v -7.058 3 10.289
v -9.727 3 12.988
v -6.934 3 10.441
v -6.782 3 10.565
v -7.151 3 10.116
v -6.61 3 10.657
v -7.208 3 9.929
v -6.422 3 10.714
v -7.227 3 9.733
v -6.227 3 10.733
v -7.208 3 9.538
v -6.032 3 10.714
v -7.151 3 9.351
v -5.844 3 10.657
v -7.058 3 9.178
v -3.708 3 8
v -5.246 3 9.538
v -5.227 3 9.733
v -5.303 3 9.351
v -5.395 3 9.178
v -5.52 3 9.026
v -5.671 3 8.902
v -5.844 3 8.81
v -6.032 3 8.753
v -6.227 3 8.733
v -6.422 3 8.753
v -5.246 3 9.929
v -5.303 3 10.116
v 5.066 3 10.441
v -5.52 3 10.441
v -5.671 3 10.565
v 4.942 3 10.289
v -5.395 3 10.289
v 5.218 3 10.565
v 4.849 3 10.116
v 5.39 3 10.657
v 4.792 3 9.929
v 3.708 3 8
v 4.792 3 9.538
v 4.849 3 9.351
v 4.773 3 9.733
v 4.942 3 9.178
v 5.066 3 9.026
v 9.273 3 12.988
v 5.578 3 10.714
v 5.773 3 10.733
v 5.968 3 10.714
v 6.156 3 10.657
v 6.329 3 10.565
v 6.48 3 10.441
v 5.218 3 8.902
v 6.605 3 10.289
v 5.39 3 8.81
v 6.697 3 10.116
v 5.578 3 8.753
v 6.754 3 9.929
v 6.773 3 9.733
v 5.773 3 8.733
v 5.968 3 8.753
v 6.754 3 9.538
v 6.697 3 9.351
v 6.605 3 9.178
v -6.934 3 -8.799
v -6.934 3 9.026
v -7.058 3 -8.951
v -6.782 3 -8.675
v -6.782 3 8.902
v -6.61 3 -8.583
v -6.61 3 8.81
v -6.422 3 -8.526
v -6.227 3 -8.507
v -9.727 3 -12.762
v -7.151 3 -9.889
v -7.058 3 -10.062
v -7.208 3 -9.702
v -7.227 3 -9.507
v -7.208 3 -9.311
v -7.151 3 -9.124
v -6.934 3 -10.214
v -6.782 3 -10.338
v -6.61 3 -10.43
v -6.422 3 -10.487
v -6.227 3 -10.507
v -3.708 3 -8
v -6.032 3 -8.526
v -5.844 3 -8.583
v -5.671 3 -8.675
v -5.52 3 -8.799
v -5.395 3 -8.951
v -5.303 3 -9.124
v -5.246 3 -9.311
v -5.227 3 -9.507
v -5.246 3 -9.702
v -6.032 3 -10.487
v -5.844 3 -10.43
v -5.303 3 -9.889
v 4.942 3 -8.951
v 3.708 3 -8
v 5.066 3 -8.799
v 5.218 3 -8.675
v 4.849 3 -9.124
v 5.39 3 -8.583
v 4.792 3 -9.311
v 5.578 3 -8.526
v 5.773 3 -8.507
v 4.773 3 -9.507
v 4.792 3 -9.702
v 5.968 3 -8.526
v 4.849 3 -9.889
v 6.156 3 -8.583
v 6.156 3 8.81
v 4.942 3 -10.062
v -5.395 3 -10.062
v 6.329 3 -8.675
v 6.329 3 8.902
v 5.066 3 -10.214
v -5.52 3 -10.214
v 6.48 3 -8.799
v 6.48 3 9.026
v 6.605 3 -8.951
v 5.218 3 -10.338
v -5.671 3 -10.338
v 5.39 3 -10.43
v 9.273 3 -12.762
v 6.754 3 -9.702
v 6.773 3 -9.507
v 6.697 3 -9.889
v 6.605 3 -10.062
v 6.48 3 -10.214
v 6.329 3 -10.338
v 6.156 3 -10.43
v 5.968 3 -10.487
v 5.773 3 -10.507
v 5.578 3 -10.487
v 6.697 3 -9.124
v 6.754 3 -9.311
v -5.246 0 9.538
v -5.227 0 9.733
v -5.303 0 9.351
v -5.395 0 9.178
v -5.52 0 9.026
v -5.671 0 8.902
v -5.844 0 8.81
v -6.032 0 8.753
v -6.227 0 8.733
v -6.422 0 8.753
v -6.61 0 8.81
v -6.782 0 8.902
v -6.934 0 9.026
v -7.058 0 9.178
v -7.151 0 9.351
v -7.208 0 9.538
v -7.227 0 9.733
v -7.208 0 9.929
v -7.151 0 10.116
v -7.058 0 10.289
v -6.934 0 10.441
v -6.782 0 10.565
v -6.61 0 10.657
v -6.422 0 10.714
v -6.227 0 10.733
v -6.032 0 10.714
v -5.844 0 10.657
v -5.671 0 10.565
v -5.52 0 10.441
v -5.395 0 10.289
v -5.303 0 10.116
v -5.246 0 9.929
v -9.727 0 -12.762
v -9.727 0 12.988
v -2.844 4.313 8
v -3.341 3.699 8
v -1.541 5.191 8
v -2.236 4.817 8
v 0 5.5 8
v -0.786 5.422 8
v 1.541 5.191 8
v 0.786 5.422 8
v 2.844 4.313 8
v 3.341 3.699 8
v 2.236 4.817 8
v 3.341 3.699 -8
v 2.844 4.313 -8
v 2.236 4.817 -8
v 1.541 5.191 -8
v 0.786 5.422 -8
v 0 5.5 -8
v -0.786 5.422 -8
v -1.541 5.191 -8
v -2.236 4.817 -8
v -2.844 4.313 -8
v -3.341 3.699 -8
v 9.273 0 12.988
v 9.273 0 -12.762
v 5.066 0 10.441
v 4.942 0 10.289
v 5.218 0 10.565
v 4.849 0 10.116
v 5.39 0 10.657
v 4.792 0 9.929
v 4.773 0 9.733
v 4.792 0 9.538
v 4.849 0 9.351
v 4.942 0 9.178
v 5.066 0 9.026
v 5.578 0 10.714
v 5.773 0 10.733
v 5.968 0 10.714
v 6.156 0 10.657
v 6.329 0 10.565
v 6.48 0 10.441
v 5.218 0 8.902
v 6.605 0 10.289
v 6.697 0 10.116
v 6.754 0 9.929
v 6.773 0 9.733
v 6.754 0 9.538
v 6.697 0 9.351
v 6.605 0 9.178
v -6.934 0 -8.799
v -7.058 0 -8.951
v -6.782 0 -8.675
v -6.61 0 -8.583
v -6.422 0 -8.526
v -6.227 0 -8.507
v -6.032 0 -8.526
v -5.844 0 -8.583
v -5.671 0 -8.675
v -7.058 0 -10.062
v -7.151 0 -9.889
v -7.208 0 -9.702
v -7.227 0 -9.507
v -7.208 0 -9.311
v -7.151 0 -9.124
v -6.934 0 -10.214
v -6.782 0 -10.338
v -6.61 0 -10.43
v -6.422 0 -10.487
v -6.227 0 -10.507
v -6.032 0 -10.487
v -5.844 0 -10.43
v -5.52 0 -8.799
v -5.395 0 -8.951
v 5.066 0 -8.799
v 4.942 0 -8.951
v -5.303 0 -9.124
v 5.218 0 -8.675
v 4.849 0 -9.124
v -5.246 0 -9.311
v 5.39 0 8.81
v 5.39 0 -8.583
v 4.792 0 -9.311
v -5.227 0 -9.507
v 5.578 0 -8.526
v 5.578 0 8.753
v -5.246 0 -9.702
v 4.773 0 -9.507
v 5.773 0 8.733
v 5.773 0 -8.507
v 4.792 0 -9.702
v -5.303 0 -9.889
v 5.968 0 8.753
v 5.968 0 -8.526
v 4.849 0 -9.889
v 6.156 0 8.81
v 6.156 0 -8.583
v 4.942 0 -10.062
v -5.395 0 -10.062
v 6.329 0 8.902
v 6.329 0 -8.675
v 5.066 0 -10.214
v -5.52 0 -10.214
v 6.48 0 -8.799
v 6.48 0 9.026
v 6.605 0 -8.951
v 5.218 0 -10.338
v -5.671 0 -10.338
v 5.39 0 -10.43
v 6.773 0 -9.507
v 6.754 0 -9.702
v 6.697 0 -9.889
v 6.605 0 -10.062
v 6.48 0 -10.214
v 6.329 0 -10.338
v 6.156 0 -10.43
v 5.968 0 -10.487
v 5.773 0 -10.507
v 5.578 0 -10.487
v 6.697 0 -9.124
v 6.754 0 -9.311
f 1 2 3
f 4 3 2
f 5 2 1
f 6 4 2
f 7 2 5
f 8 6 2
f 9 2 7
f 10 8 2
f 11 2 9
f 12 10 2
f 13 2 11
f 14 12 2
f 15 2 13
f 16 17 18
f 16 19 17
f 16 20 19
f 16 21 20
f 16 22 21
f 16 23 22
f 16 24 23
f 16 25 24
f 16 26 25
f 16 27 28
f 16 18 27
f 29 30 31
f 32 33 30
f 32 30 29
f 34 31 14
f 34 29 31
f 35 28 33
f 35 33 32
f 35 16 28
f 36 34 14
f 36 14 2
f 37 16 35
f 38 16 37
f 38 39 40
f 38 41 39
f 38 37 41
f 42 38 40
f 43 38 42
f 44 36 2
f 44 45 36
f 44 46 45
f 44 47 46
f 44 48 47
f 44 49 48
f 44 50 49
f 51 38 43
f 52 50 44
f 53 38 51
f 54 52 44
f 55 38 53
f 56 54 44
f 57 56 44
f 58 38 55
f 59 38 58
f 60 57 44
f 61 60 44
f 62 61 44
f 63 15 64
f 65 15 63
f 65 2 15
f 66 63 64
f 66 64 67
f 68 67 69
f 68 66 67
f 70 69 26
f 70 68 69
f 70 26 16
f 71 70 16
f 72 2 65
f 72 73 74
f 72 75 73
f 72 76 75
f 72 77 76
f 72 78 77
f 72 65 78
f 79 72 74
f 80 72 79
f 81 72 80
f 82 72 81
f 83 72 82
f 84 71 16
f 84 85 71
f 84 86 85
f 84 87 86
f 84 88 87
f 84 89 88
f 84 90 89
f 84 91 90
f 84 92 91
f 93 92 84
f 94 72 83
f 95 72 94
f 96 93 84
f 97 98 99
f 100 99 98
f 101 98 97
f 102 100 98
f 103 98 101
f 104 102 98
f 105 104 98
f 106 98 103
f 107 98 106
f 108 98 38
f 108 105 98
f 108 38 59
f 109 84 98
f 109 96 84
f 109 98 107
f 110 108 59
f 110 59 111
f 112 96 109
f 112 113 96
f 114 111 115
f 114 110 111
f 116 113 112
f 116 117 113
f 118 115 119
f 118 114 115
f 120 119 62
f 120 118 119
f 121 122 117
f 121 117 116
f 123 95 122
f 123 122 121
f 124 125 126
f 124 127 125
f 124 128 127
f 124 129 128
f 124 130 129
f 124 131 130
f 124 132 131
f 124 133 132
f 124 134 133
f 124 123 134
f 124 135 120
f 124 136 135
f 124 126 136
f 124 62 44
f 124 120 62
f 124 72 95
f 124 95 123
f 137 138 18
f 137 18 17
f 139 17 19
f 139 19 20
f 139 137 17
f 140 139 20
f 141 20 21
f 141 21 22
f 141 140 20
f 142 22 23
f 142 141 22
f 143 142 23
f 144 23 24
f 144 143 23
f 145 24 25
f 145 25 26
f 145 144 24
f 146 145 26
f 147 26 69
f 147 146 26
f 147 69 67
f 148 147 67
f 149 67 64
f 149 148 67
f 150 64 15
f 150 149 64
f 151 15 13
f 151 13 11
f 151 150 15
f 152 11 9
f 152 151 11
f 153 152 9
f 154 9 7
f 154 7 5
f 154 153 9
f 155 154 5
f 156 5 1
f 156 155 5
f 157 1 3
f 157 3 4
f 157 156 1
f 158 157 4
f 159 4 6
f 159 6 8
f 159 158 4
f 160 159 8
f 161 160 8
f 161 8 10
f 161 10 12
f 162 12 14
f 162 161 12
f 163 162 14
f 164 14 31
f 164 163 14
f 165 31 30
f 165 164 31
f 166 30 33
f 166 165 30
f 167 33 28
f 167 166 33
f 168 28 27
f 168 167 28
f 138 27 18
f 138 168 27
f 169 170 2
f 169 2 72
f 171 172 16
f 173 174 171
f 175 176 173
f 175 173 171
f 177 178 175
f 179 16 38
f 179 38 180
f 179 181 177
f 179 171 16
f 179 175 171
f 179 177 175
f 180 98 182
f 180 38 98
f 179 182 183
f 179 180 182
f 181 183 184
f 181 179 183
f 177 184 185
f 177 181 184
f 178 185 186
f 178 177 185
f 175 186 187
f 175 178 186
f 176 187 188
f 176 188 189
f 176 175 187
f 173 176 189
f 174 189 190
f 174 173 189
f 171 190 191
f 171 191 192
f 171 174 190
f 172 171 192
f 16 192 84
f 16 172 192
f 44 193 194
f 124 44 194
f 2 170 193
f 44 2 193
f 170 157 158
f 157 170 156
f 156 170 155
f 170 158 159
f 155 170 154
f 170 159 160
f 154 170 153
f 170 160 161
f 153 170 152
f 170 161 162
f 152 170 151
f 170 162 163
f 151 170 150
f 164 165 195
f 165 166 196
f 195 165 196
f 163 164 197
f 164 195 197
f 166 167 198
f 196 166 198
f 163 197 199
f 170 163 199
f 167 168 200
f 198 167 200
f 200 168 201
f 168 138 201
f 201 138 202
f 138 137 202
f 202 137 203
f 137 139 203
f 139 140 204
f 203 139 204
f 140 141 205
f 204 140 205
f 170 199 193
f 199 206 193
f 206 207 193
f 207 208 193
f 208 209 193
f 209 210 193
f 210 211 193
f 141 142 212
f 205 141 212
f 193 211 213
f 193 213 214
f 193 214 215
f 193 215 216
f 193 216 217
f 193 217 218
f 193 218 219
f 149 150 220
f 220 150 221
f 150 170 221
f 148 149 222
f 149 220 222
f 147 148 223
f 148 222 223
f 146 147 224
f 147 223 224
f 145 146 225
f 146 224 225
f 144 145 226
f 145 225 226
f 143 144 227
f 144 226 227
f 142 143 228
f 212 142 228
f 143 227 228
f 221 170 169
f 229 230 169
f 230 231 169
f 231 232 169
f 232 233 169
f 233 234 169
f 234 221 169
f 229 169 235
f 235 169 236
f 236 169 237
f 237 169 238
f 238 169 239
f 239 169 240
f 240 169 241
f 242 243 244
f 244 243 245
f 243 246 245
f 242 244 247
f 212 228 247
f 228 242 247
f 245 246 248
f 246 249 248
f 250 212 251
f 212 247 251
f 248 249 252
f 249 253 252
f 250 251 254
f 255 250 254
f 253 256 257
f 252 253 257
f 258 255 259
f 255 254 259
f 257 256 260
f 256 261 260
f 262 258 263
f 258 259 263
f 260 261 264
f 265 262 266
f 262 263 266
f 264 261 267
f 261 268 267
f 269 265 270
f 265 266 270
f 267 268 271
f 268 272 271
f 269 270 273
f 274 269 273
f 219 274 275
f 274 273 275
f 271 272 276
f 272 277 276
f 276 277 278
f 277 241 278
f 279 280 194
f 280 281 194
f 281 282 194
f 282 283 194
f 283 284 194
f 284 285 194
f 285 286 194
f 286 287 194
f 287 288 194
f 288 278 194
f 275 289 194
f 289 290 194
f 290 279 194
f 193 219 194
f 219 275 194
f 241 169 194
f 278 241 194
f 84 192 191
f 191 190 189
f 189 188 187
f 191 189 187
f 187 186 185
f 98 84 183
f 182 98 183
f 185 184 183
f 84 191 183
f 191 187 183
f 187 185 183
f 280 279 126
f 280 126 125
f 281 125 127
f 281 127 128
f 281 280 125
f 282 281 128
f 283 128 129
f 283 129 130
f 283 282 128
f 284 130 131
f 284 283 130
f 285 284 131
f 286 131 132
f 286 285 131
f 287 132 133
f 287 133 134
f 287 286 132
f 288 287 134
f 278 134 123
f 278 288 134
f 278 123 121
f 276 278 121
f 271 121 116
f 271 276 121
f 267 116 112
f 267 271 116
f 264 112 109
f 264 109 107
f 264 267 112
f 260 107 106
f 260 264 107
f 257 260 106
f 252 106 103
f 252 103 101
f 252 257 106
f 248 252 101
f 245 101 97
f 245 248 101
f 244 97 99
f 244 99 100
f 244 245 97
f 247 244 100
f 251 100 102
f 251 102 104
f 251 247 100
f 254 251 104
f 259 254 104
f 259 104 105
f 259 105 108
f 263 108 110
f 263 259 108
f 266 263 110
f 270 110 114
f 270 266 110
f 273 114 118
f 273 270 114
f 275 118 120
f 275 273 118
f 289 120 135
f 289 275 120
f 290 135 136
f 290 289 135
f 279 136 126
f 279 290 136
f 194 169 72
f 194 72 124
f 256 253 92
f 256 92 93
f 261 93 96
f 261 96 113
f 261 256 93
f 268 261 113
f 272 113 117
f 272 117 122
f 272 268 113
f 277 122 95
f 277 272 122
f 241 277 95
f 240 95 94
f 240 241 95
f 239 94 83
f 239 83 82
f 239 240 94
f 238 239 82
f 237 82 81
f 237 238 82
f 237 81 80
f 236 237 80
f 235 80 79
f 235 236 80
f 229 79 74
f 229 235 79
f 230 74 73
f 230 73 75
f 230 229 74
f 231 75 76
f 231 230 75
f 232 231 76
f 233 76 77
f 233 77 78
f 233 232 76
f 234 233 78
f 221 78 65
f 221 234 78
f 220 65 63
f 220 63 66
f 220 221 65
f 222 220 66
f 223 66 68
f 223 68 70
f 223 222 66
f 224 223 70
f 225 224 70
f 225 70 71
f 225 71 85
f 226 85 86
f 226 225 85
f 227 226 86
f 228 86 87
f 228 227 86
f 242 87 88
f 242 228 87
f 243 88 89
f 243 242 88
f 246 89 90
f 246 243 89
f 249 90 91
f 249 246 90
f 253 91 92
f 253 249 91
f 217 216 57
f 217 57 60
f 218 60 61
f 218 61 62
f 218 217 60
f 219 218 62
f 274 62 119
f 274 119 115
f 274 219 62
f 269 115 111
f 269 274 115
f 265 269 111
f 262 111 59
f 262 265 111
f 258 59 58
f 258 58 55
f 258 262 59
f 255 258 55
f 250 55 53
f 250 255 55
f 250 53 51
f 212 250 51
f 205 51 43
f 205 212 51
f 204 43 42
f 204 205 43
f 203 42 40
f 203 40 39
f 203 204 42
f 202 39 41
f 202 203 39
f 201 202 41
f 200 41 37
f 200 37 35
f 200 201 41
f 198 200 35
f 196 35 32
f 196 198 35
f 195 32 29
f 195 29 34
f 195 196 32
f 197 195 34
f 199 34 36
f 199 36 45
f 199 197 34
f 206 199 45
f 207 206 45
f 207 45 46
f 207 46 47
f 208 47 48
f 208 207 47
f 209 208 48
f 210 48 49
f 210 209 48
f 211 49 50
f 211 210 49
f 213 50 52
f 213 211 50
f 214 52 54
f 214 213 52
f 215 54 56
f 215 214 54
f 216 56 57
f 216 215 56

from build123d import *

# Parameters (mm, degrees)
CROQUIS1_W                   = 19
CROQUIS1_H                   = 25.75
CROQUIS1_R                   = 1.000000029
CROQUIS1_R_2                 = 0.999999792
CROQUIS1_R_3                 = 1.000000052
CROQUIS1_R_4                 = 1.000000059
SALIENTE_EXTRUIR1_DEPTH      = 3
SALIENTE_EXTRUIR2_DEPTH      = 8
SALIENTE_EXTRUIR2_DEPTH_BACK = 8


with BuildPart() as part:
    # Croquis1 → Saliente-Extruir1 (new body)
    with BuildSketch(Plane(origin=(0, 0, 0), x_dir=(1, 0, 0), z_dir=(0, 1, 0))):
        with Locations((-0.226911439, -0.113455719)):
            Rectangle(CROQUIS1_W, CROQUIS1_H)
        with Locations((-6.226911361, 9.506544208)):
            Circle(CROQUIS1_R, mode=Mode.SUBTRACT)
        with Locations((5.773088267, 9.506544313)):
            Circle(CROQUIS1_R_2, mode=Mode.SUBTRACT)
        with Locations((5.773088494, -9.733455829)):
            Circle(CROQUIS1_R_3, mode=Mode.SUBTRACT)
        with Locations((-6.226911268, -9.733455698)):
            Circle(CROQUIS1_R_4, mode=Mode.SUBTRACT)
    extrude(amount=SALIENTE_EXTRUIR1_DEPTH)

    # Croquis2 → Saliente-Extruir2 (add, two sides)
    with BuildSketch(Plane.XY) as saliente_extruir2_sk:
        with BuildLine():
            Line((-3.708099244, 3), (3.708099244, 3))
            ThreePointArc((3.708099244, 3), (0, 5.5), (-3.708099244, 3))
        make_face()
    extrude(amount=SALIENTE_EXTRUIR2_DEPTH)
    extrude(saliente_extruir2_sk.sketch, amount=-SALIENTE_EXTRUIR2_DEPTH_BACK)


solid = part.part
